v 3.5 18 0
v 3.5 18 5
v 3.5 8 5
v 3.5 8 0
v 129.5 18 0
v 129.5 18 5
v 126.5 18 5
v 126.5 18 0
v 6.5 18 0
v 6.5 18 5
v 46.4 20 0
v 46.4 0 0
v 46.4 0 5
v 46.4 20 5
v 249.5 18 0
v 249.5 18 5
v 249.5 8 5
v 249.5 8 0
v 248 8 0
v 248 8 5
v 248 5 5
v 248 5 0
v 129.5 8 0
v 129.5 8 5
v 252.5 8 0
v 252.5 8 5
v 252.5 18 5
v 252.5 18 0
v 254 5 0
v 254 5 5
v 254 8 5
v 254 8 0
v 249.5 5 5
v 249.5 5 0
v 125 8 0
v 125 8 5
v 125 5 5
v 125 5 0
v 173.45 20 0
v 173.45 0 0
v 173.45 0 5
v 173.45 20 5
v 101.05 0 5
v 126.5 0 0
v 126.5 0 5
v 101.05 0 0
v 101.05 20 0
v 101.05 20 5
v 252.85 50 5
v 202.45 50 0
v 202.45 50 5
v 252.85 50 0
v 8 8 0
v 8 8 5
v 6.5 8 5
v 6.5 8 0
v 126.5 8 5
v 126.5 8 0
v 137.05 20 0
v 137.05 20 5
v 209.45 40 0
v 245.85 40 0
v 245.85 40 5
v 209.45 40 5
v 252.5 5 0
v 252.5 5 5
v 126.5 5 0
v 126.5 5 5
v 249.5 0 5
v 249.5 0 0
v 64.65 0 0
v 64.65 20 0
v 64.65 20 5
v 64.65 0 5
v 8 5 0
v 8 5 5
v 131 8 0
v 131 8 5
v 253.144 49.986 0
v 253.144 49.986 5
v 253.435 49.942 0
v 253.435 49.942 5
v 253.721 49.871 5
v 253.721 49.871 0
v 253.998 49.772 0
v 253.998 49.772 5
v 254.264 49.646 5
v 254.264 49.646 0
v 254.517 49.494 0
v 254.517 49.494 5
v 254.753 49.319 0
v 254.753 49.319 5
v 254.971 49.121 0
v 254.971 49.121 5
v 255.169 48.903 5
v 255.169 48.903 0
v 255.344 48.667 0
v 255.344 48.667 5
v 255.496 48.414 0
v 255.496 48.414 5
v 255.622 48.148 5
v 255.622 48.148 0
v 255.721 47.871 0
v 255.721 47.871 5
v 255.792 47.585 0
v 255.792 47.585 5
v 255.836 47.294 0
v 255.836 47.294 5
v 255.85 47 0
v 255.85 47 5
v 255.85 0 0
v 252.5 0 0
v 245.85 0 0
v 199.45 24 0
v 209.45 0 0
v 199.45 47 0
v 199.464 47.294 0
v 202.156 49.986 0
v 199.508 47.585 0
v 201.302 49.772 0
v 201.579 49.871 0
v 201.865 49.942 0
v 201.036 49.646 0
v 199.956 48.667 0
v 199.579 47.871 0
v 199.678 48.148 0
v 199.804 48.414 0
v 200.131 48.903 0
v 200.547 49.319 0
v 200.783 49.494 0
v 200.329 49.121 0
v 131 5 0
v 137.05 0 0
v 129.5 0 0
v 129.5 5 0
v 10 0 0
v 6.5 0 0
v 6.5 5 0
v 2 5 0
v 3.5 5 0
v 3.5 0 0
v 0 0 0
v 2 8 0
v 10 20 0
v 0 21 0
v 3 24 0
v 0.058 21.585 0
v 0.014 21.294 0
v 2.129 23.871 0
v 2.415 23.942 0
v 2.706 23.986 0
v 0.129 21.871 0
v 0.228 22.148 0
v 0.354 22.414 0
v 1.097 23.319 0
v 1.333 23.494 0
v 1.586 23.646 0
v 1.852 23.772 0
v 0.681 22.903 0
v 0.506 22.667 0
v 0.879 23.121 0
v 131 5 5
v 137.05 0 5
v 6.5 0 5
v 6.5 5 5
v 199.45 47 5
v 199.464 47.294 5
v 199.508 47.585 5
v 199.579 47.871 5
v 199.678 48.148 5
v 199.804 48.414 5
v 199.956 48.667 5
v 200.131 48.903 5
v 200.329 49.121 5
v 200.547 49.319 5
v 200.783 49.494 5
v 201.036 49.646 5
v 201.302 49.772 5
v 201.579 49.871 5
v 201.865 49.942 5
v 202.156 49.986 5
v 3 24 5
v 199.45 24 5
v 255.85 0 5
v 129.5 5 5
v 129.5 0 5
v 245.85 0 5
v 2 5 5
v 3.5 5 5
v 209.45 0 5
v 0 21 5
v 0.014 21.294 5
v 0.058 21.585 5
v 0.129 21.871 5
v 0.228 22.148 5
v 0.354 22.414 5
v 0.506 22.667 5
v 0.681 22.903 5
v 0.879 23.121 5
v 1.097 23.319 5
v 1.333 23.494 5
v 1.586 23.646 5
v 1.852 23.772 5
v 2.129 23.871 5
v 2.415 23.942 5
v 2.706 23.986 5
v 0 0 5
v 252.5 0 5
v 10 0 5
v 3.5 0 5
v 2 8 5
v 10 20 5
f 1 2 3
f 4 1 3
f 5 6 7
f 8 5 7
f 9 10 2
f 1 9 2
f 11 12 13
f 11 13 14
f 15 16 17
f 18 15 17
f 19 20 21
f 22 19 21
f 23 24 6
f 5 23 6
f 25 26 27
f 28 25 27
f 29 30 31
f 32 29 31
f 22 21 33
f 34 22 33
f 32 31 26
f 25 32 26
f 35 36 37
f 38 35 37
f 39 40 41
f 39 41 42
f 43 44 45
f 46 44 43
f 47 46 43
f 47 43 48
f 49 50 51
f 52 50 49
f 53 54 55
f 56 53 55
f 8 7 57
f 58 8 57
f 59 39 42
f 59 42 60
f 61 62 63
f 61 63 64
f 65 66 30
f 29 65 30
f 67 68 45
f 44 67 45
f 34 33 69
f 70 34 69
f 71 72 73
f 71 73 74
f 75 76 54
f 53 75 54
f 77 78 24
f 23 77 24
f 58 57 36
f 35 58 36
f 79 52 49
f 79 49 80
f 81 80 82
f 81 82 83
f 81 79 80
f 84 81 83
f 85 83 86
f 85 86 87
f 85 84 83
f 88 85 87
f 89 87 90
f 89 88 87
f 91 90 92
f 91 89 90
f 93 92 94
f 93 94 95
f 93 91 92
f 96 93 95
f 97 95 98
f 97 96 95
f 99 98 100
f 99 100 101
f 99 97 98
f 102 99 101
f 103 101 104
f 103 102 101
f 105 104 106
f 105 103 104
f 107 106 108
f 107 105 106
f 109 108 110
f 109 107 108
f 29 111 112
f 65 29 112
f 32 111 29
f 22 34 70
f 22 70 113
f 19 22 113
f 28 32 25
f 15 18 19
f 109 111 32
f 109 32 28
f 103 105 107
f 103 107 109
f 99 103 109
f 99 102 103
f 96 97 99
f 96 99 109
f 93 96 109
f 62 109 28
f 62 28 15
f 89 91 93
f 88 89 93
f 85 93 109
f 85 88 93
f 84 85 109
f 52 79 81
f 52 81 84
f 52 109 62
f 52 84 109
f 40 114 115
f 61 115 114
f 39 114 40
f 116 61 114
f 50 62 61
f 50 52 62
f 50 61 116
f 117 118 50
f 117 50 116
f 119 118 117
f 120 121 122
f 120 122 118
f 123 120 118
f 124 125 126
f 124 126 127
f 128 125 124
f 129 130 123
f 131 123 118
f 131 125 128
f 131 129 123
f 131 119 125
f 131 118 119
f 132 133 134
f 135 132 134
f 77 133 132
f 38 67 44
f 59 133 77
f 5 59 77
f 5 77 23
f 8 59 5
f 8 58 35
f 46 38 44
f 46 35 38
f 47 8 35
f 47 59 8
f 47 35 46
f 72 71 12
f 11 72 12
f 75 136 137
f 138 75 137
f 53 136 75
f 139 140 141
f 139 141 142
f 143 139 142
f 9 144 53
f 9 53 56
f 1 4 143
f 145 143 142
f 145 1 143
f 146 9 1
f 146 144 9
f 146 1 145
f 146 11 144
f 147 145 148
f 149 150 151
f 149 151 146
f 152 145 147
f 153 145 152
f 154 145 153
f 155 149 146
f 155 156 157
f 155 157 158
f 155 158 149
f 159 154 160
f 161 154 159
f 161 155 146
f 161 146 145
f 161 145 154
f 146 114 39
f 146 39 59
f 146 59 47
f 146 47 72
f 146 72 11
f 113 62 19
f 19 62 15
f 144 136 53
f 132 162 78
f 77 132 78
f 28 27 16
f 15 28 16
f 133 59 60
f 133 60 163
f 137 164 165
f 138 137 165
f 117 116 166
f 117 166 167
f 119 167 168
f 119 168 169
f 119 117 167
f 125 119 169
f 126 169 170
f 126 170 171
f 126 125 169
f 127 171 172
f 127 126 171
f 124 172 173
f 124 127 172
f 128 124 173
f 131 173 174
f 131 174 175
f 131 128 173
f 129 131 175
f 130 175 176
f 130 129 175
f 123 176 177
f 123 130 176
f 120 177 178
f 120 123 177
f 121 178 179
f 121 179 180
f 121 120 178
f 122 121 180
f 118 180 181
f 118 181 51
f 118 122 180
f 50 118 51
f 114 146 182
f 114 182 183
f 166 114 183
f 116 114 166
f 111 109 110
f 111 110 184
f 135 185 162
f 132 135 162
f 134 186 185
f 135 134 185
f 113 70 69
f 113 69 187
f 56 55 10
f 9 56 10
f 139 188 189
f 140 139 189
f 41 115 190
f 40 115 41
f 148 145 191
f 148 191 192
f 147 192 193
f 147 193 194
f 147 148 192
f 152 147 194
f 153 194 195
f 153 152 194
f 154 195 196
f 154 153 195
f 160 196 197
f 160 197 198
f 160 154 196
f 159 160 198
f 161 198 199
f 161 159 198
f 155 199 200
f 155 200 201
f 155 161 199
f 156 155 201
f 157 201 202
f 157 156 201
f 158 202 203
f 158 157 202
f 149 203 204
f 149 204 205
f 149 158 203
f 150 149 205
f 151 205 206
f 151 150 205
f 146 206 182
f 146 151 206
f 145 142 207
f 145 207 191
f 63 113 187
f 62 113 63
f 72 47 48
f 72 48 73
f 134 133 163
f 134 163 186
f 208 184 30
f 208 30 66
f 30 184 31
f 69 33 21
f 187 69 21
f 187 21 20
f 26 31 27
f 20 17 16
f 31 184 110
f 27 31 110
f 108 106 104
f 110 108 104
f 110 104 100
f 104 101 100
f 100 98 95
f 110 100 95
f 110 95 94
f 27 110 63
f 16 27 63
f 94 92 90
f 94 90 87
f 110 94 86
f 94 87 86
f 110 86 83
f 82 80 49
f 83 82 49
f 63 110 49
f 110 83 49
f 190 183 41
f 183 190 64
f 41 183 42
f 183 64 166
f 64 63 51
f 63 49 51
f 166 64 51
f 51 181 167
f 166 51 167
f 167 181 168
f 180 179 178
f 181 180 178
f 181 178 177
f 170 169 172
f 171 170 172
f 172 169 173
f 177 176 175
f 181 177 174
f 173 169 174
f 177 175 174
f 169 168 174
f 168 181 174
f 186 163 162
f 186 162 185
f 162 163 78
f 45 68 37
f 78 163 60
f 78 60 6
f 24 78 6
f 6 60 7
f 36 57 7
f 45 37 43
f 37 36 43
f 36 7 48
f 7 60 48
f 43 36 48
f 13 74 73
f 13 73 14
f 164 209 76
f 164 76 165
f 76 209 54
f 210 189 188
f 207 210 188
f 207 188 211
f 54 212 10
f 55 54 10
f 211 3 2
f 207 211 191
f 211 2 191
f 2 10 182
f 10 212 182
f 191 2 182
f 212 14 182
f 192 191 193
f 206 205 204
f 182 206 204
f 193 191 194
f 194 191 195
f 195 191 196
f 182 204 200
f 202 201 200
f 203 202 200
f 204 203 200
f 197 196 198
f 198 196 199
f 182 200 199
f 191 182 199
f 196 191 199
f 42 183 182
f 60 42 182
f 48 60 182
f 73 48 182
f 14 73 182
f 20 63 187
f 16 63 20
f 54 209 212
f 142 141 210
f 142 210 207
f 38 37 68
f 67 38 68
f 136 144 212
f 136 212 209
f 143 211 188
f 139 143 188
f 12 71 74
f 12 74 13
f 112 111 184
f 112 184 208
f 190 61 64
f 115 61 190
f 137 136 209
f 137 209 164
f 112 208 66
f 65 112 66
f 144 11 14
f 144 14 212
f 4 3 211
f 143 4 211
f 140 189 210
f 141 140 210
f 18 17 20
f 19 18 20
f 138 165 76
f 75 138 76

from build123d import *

# Parameters (mm, degrees)
BOSS_EXTRU_1_DEPTH         = 5
ENL_V_MAT_EXTRU_2_DEPTH    = 5
R_P_TITION_LIN_AIRE1_COUNT = 3
R_P_TITION_LIN_AIRE1_PITCH = 123


with BuildPart() as part:
    # Esquisse1 → Boss.-Extru.1 (new body)
    with BuildSketch(Plane.XY):
        with BuildLine():
            Line((0, 0), (0, 21))
            ThreePointArc((0, 21), (0.878679656, 23.121320344), (3, 24))
            Line((3, 24), (199.45, 24))
            Line((199.45, 24), (199.45, 47))
            ThreePointArc((199.45, 47), (200.328679656, 49.121320344), (202.45, 50))
            Line((202.45, 50), (252.85, 50))
            ThreePointArc((252.85, 50), (254.971320344, 49.121320344), (255.85, 47))
            Line((255.85, 47), (255.85, 0))
            Line((255.85, 0), (245.85, 0))
            Line((245.85, 0), (245.85, 40))
            Line((245.85, 40), (209.45, 40))
            Line((209.45, 40), (209.45, 0))
            Line((209.45, 0), (173.45, 0))
            Line((173.45, 0), (173.45, 20))
            Line((173.45, 20), (137.05, 20))
            Line((137.05, 20), (137.05, 0))
            Line((137.05, 0), (101.05, 0))
            Line((101.05, 0), (101.05, 20))
            Line((101.05, 20), (64.65, 20))
            Line((64.65, 20), (64.65, 0))
            Line((64.65, 0), (46.4, 0))
            Line((46.4, 0), (46.4, 20))
            Line((46.4, 20), (10, 20))
            Line((10, 20), (10, 0))
            Line((10, 0), (0, 0))
        make_face()
    extrude(amount=BOSS_EXTRU_1_DEPTH)

    # Esquisse2 → Enlèv. mat.-Extru.2 (cut)
    with BuildSketch(Plane.XY.offset(5)):
        Polygon((6.5, 0), (6.5, 5), (8, 5), (8, 8), (6.5, 8), (6.5, 18), (3.5, 18), (3.5, 8), (2, 8), (2, 5), (3.5, 5), (3.5, 0), align=None)
    enl_v_mat_extru_2 = extrude(amount=-ENL_V_MAT_EXTRU_2_DEPTH, mode=Mode.SUBTRACT)

    # Répétition linéaire1: Enlèv. mat.-Extru.2 ×3
    with Locations(*[(i * R_P_TITION_LIN_AIRE1_PITCH, 0, 0) for i in range(1, R_P_TITION_LIN_AIRE1_COUNT)]):
        add(enl_v_mat_extru_2, mode=Mode.SUBTRACT)


solid = part.part
